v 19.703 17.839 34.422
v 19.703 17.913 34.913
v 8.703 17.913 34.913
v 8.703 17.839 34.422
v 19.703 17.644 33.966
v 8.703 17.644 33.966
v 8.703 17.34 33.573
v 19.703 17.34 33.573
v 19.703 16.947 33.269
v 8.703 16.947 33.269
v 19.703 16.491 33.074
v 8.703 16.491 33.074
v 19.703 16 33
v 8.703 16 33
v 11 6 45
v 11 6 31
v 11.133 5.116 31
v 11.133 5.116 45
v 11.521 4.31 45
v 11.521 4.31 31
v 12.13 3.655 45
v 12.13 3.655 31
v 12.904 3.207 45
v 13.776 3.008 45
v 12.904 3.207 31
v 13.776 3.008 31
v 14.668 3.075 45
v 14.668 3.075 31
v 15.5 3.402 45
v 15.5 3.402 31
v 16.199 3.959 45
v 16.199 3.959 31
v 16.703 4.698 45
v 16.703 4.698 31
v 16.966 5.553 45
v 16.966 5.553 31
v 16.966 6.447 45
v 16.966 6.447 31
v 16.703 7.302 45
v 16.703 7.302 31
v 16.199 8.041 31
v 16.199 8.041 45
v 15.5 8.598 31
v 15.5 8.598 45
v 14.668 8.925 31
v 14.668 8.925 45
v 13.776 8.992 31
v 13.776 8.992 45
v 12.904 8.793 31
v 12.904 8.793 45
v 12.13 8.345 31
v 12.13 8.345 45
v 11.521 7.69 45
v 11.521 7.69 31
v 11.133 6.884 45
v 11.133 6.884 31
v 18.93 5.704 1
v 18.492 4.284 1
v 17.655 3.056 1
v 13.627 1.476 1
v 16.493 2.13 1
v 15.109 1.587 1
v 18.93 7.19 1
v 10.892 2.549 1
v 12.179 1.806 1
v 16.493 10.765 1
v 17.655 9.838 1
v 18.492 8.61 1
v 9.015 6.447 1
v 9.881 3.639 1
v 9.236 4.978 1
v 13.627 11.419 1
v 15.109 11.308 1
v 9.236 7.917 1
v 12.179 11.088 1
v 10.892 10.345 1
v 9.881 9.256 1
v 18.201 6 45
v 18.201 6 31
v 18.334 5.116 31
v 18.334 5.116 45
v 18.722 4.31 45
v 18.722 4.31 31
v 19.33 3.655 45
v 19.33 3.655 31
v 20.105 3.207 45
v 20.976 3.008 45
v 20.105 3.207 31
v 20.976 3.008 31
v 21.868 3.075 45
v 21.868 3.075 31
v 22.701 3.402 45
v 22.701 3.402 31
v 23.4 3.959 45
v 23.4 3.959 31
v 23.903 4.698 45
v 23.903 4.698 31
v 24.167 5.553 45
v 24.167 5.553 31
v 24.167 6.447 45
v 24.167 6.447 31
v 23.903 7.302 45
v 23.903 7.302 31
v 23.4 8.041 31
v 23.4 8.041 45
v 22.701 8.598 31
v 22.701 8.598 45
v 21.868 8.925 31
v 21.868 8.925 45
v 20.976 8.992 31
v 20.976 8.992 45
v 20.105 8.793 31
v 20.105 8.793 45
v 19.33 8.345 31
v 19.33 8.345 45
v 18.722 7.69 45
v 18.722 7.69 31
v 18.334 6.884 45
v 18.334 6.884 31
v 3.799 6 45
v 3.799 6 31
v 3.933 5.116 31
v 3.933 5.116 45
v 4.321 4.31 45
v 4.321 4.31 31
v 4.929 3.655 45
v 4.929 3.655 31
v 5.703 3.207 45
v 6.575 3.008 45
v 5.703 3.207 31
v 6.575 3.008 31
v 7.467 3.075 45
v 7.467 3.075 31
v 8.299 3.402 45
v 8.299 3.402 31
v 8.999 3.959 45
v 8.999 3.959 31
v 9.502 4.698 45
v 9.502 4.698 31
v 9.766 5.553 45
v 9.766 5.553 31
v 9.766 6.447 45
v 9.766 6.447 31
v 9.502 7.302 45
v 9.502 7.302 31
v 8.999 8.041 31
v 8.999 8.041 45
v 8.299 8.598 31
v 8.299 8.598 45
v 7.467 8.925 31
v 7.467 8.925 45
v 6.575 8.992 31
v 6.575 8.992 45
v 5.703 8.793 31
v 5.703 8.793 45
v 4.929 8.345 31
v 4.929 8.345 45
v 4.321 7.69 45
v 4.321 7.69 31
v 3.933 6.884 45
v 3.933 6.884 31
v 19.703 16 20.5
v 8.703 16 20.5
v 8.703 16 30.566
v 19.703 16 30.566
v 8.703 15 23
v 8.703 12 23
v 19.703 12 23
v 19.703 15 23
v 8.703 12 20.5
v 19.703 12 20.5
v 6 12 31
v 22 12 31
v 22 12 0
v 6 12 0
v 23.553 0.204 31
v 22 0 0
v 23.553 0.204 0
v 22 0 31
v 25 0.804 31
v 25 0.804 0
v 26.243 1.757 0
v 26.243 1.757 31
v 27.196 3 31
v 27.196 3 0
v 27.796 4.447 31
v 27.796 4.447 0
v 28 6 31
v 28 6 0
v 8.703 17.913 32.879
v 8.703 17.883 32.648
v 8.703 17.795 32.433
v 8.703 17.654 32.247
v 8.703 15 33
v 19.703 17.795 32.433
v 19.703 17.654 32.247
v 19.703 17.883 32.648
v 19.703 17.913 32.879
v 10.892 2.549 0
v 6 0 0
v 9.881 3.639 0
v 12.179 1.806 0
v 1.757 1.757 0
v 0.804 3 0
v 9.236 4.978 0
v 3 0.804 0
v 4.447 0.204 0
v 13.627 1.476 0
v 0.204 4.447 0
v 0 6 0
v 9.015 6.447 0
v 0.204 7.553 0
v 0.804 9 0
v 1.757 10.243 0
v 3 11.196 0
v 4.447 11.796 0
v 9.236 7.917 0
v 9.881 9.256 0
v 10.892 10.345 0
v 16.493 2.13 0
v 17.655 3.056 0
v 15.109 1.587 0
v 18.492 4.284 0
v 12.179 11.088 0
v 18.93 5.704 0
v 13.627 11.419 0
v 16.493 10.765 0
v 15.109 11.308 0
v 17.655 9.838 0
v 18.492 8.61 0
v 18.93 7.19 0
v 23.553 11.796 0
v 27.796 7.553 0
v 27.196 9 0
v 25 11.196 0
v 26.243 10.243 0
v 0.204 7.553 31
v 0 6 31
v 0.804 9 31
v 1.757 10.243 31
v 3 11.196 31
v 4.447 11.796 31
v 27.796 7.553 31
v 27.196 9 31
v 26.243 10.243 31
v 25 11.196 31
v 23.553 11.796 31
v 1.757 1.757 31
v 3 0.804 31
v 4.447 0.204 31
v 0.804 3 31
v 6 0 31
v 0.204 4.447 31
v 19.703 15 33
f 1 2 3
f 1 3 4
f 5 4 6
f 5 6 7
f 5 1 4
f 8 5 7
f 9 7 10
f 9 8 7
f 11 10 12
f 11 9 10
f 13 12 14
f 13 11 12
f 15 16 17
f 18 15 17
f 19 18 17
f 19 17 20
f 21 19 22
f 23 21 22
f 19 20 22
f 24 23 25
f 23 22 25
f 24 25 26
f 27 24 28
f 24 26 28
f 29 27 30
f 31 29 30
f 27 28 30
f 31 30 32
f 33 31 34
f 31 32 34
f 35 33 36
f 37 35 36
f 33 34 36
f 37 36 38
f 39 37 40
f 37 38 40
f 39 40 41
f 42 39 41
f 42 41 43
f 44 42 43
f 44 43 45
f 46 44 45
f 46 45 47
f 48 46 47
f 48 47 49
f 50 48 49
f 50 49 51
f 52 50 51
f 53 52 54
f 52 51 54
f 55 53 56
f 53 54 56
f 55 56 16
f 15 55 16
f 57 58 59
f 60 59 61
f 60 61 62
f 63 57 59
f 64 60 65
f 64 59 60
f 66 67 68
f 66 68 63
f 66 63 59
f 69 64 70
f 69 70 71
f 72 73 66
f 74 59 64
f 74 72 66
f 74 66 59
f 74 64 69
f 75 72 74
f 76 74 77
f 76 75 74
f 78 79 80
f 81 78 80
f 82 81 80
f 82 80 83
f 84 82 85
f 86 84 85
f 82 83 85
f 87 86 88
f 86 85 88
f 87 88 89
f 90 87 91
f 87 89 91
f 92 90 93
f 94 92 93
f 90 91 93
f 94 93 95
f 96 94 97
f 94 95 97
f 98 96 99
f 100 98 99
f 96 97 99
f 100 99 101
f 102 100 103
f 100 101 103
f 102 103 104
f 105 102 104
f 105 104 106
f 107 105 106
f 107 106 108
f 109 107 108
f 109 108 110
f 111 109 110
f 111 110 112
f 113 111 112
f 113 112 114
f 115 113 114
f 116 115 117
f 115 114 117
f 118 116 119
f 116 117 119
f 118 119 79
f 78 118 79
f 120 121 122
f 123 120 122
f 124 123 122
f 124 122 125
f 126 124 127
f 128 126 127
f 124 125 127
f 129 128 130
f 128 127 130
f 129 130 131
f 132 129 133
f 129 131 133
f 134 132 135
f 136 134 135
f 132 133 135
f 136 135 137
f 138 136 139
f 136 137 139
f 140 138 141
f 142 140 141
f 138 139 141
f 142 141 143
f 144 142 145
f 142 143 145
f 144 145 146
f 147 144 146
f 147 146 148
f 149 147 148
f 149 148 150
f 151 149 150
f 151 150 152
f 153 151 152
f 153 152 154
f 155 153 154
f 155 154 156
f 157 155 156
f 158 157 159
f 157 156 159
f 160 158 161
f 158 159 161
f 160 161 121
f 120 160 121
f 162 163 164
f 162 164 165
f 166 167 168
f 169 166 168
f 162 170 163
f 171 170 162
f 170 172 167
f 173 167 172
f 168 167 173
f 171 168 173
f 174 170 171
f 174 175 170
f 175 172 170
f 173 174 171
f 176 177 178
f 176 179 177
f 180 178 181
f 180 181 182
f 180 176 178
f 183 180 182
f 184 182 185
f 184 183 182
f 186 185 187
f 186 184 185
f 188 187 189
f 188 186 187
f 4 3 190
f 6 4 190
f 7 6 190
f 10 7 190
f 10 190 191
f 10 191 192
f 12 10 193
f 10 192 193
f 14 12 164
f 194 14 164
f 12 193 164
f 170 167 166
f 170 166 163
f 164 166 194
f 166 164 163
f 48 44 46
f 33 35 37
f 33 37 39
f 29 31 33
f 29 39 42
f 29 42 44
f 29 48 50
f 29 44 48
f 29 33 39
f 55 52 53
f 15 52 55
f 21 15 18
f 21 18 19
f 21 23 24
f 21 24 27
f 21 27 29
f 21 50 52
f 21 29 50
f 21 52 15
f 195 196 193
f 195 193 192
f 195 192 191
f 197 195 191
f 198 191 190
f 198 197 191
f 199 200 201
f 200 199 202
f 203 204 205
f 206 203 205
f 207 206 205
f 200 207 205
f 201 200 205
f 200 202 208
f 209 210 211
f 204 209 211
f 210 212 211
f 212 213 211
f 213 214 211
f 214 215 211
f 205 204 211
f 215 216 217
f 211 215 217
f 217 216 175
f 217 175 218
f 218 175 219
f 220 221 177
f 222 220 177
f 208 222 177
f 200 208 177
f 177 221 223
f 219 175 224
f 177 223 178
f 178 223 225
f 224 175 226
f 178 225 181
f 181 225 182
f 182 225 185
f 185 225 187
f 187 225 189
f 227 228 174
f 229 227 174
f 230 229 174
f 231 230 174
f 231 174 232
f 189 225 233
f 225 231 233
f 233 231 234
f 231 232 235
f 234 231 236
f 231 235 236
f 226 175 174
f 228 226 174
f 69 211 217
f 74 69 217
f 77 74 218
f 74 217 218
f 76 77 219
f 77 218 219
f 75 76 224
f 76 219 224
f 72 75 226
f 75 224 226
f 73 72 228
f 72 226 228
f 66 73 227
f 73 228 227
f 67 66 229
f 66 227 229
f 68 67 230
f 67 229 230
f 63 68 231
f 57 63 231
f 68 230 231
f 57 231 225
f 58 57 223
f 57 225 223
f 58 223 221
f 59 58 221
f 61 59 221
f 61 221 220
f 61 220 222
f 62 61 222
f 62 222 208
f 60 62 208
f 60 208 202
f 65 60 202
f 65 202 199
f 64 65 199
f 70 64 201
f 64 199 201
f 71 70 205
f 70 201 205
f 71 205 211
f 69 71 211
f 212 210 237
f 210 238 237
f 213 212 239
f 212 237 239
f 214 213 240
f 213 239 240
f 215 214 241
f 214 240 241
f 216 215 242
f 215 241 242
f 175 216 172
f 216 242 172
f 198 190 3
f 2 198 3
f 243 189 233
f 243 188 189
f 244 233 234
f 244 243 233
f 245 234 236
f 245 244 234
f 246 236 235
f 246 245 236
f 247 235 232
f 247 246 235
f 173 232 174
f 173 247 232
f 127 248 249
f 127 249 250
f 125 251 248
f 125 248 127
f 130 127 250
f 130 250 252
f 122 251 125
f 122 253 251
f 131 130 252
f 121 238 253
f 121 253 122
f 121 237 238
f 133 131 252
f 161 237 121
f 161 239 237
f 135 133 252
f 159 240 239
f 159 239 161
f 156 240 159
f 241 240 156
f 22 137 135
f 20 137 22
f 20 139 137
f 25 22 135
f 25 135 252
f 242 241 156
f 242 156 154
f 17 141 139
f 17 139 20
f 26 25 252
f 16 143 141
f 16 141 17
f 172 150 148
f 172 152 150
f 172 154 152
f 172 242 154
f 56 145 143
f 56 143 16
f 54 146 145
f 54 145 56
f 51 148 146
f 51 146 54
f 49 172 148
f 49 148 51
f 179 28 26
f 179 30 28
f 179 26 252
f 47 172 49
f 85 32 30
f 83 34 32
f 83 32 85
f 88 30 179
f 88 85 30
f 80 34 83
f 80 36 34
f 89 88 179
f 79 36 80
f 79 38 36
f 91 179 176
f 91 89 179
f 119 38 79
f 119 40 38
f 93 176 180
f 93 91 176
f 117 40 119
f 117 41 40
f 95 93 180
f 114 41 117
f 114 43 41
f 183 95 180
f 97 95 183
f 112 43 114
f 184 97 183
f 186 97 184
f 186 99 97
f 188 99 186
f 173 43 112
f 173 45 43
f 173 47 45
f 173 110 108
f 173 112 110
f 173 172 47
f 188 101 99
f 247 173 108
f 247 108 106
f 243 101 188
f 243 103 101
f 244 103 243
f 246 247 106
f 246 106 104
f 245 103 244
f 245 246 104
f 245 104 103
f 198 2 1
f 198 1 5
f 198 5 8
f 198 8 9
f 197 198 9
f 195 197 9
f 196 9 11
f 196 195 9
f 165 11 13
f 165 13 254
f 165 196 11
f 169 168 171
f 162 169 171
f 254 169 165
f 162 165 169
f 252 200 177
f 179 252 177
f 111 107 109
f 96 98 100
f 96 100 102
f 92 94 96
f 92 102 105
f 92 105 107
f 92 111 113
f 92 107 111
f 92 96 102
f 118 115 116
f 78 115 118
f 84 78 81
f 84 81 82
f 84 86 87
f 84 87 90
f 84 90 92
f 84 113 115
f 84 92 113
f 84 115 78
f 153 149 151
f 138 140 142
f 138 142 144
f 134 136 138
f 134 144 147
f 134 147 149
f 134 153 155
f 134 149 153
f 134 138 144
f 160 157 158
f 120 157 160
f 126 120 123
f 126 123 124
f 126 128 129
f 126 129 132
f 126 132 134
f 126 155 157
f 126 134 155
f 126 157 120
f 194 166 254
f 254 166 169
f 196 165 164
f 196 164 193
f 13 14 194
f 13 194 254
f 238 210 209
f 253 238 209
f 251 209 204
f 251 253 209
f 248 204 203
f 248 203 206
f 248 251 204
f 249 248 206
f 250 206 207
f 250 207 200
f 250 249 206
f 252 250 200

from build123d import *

# Parameters (mm, degrees)
SKETCH_1_W          = 28
SKETCH_1_H          = 12
EXTRUDE_1_DEPTH     = 31
FILLET_1_R          = 6
SKETCH_2_R          = 3
EXTRUDE_2_DEPTH     = 14
SKETCH_3_W          = 11
SKETCH_3_H          = 2.5
EXTRUDE_3_DEPTH     = 4
SKETCH_4_W          = 11
SKETCH_4_H          = 1
EXTRUDE_4_DEPTH     = 10
EXTRUDE_5_DEPTH     = 11
SKETCH_7_R          = 4.985468992
CUT_EXTRUDE_1_DEPTH = 1


with BuildPart() as part:
    # ｽｹｯﾁ1 → ﾎﾞｽ - 押し出し1 (new body)
    with BuildSketch(Plane.XY):
        with Locations((14, 6)):
            Rectangle(SKETCH_1_W, SKETCH_1_H)
    extrude(amount=EXTRUDE_1_DEPTH)

    # ﾌｨﾚｯﾄ1
    fillet_1_edges = [part.edges().sort_by_distance(p)[0] for p in [
        (28, 0, 15.5),
        (28, 12, 15.5),
        (0, 0, 15.5),
        (0, 12, 15.5),
    ]]
    fillet(fillet_1_edges, radius=FILLET_1_R - 0.0001)  # a hair under: the kernel refuses the full size

    # ｽｹｯﾁ2 → ﾎﾞｽ - 押し出し2 (add)
    with BuildSketch(Plane.XY.offset(31)):
        with Locations(Location((14, 6, 0), (0, 0, 180))):
            Circle(SKETCH_2_R)
        with Locations(Location((6.799424136, 6, 0), (0, 0, 180))):
            Circle(SKETCH_2_R)
        with Locations(Location((21.200575864, 6, 0), (0, 0, 180))):
            Circle(SKETCH_2_R)
    extrude(amount=EXTRUDE_2_DEPTH)

    # ｽｹｯﾁ3 → ﾎﾞｽ - 押し出し3 (add)
    with BuildSketch(Plane(origin=(0, 12, 0), x_dir=(1, 0, 0), z_dir=(0, 1, 0))):
        with Locations((14.202566522, -21.75)):
            Rectangle(SKETCH_3_W, SKETCH_3_H)
    extrude(amount=EXTRUDE_3_DEPTH)

    # ｽｹｯﾁ4 → ﾎﾞｽ - 押し出し4 (add)
    with BuildSketch(Plane.XY.offset(23)):
        with Locations((14.202566522, 15.5)):
            Rectangle(SKETCH_4_W, SKETCH_4_H)
    extrude(amount=EXTRUDE_4_DEPTH)

    # ｽｹｯﾁ6 → ﾎﾞｽ - 押し出し5 (add)
    with BuildSketch(Plane(origin=(19.702566522, 0, 0), x_dir=(0, 0, -1), z_dir=(1, 0, 0))):
        with BuildLine():
            Line((-32.878667376, 17.912838666), (-34.912838666, 17.912838666))
            ThreePointArc((-34.912838666, 17.912838666), (-33.572911973, 17.339926693), (-33, 16))
            Line((-33, 16), (-30.566032893, 16))
            Line((-30.566032893, 16), (-32.247451697, 17.654373362))
            ThreePointArc((-32.247451697, 17.654373362), (-32.537625756, 17.845719578), (-32.878667376, 17.912838666))
        make_face()
    extrude(amount=-EXTRUDE_5_DEPTH)

    # ｽｹｯﾁ7 → ｶｯﾄ - 押し出し1 (cut)
    with BuildSketch(Plane(origin=(0, 0, 0), x_dir=(-1, 0, 0), z_dir=(0, 0, -1))):
        with Locations((-14, 6.447278685)):
            Circle(SKETCH_7_R)
    extrude(amount=-CUT_EXTRUDE_1_DEPTH, mode=Mode.SUBTRACT)


solid = part.part
